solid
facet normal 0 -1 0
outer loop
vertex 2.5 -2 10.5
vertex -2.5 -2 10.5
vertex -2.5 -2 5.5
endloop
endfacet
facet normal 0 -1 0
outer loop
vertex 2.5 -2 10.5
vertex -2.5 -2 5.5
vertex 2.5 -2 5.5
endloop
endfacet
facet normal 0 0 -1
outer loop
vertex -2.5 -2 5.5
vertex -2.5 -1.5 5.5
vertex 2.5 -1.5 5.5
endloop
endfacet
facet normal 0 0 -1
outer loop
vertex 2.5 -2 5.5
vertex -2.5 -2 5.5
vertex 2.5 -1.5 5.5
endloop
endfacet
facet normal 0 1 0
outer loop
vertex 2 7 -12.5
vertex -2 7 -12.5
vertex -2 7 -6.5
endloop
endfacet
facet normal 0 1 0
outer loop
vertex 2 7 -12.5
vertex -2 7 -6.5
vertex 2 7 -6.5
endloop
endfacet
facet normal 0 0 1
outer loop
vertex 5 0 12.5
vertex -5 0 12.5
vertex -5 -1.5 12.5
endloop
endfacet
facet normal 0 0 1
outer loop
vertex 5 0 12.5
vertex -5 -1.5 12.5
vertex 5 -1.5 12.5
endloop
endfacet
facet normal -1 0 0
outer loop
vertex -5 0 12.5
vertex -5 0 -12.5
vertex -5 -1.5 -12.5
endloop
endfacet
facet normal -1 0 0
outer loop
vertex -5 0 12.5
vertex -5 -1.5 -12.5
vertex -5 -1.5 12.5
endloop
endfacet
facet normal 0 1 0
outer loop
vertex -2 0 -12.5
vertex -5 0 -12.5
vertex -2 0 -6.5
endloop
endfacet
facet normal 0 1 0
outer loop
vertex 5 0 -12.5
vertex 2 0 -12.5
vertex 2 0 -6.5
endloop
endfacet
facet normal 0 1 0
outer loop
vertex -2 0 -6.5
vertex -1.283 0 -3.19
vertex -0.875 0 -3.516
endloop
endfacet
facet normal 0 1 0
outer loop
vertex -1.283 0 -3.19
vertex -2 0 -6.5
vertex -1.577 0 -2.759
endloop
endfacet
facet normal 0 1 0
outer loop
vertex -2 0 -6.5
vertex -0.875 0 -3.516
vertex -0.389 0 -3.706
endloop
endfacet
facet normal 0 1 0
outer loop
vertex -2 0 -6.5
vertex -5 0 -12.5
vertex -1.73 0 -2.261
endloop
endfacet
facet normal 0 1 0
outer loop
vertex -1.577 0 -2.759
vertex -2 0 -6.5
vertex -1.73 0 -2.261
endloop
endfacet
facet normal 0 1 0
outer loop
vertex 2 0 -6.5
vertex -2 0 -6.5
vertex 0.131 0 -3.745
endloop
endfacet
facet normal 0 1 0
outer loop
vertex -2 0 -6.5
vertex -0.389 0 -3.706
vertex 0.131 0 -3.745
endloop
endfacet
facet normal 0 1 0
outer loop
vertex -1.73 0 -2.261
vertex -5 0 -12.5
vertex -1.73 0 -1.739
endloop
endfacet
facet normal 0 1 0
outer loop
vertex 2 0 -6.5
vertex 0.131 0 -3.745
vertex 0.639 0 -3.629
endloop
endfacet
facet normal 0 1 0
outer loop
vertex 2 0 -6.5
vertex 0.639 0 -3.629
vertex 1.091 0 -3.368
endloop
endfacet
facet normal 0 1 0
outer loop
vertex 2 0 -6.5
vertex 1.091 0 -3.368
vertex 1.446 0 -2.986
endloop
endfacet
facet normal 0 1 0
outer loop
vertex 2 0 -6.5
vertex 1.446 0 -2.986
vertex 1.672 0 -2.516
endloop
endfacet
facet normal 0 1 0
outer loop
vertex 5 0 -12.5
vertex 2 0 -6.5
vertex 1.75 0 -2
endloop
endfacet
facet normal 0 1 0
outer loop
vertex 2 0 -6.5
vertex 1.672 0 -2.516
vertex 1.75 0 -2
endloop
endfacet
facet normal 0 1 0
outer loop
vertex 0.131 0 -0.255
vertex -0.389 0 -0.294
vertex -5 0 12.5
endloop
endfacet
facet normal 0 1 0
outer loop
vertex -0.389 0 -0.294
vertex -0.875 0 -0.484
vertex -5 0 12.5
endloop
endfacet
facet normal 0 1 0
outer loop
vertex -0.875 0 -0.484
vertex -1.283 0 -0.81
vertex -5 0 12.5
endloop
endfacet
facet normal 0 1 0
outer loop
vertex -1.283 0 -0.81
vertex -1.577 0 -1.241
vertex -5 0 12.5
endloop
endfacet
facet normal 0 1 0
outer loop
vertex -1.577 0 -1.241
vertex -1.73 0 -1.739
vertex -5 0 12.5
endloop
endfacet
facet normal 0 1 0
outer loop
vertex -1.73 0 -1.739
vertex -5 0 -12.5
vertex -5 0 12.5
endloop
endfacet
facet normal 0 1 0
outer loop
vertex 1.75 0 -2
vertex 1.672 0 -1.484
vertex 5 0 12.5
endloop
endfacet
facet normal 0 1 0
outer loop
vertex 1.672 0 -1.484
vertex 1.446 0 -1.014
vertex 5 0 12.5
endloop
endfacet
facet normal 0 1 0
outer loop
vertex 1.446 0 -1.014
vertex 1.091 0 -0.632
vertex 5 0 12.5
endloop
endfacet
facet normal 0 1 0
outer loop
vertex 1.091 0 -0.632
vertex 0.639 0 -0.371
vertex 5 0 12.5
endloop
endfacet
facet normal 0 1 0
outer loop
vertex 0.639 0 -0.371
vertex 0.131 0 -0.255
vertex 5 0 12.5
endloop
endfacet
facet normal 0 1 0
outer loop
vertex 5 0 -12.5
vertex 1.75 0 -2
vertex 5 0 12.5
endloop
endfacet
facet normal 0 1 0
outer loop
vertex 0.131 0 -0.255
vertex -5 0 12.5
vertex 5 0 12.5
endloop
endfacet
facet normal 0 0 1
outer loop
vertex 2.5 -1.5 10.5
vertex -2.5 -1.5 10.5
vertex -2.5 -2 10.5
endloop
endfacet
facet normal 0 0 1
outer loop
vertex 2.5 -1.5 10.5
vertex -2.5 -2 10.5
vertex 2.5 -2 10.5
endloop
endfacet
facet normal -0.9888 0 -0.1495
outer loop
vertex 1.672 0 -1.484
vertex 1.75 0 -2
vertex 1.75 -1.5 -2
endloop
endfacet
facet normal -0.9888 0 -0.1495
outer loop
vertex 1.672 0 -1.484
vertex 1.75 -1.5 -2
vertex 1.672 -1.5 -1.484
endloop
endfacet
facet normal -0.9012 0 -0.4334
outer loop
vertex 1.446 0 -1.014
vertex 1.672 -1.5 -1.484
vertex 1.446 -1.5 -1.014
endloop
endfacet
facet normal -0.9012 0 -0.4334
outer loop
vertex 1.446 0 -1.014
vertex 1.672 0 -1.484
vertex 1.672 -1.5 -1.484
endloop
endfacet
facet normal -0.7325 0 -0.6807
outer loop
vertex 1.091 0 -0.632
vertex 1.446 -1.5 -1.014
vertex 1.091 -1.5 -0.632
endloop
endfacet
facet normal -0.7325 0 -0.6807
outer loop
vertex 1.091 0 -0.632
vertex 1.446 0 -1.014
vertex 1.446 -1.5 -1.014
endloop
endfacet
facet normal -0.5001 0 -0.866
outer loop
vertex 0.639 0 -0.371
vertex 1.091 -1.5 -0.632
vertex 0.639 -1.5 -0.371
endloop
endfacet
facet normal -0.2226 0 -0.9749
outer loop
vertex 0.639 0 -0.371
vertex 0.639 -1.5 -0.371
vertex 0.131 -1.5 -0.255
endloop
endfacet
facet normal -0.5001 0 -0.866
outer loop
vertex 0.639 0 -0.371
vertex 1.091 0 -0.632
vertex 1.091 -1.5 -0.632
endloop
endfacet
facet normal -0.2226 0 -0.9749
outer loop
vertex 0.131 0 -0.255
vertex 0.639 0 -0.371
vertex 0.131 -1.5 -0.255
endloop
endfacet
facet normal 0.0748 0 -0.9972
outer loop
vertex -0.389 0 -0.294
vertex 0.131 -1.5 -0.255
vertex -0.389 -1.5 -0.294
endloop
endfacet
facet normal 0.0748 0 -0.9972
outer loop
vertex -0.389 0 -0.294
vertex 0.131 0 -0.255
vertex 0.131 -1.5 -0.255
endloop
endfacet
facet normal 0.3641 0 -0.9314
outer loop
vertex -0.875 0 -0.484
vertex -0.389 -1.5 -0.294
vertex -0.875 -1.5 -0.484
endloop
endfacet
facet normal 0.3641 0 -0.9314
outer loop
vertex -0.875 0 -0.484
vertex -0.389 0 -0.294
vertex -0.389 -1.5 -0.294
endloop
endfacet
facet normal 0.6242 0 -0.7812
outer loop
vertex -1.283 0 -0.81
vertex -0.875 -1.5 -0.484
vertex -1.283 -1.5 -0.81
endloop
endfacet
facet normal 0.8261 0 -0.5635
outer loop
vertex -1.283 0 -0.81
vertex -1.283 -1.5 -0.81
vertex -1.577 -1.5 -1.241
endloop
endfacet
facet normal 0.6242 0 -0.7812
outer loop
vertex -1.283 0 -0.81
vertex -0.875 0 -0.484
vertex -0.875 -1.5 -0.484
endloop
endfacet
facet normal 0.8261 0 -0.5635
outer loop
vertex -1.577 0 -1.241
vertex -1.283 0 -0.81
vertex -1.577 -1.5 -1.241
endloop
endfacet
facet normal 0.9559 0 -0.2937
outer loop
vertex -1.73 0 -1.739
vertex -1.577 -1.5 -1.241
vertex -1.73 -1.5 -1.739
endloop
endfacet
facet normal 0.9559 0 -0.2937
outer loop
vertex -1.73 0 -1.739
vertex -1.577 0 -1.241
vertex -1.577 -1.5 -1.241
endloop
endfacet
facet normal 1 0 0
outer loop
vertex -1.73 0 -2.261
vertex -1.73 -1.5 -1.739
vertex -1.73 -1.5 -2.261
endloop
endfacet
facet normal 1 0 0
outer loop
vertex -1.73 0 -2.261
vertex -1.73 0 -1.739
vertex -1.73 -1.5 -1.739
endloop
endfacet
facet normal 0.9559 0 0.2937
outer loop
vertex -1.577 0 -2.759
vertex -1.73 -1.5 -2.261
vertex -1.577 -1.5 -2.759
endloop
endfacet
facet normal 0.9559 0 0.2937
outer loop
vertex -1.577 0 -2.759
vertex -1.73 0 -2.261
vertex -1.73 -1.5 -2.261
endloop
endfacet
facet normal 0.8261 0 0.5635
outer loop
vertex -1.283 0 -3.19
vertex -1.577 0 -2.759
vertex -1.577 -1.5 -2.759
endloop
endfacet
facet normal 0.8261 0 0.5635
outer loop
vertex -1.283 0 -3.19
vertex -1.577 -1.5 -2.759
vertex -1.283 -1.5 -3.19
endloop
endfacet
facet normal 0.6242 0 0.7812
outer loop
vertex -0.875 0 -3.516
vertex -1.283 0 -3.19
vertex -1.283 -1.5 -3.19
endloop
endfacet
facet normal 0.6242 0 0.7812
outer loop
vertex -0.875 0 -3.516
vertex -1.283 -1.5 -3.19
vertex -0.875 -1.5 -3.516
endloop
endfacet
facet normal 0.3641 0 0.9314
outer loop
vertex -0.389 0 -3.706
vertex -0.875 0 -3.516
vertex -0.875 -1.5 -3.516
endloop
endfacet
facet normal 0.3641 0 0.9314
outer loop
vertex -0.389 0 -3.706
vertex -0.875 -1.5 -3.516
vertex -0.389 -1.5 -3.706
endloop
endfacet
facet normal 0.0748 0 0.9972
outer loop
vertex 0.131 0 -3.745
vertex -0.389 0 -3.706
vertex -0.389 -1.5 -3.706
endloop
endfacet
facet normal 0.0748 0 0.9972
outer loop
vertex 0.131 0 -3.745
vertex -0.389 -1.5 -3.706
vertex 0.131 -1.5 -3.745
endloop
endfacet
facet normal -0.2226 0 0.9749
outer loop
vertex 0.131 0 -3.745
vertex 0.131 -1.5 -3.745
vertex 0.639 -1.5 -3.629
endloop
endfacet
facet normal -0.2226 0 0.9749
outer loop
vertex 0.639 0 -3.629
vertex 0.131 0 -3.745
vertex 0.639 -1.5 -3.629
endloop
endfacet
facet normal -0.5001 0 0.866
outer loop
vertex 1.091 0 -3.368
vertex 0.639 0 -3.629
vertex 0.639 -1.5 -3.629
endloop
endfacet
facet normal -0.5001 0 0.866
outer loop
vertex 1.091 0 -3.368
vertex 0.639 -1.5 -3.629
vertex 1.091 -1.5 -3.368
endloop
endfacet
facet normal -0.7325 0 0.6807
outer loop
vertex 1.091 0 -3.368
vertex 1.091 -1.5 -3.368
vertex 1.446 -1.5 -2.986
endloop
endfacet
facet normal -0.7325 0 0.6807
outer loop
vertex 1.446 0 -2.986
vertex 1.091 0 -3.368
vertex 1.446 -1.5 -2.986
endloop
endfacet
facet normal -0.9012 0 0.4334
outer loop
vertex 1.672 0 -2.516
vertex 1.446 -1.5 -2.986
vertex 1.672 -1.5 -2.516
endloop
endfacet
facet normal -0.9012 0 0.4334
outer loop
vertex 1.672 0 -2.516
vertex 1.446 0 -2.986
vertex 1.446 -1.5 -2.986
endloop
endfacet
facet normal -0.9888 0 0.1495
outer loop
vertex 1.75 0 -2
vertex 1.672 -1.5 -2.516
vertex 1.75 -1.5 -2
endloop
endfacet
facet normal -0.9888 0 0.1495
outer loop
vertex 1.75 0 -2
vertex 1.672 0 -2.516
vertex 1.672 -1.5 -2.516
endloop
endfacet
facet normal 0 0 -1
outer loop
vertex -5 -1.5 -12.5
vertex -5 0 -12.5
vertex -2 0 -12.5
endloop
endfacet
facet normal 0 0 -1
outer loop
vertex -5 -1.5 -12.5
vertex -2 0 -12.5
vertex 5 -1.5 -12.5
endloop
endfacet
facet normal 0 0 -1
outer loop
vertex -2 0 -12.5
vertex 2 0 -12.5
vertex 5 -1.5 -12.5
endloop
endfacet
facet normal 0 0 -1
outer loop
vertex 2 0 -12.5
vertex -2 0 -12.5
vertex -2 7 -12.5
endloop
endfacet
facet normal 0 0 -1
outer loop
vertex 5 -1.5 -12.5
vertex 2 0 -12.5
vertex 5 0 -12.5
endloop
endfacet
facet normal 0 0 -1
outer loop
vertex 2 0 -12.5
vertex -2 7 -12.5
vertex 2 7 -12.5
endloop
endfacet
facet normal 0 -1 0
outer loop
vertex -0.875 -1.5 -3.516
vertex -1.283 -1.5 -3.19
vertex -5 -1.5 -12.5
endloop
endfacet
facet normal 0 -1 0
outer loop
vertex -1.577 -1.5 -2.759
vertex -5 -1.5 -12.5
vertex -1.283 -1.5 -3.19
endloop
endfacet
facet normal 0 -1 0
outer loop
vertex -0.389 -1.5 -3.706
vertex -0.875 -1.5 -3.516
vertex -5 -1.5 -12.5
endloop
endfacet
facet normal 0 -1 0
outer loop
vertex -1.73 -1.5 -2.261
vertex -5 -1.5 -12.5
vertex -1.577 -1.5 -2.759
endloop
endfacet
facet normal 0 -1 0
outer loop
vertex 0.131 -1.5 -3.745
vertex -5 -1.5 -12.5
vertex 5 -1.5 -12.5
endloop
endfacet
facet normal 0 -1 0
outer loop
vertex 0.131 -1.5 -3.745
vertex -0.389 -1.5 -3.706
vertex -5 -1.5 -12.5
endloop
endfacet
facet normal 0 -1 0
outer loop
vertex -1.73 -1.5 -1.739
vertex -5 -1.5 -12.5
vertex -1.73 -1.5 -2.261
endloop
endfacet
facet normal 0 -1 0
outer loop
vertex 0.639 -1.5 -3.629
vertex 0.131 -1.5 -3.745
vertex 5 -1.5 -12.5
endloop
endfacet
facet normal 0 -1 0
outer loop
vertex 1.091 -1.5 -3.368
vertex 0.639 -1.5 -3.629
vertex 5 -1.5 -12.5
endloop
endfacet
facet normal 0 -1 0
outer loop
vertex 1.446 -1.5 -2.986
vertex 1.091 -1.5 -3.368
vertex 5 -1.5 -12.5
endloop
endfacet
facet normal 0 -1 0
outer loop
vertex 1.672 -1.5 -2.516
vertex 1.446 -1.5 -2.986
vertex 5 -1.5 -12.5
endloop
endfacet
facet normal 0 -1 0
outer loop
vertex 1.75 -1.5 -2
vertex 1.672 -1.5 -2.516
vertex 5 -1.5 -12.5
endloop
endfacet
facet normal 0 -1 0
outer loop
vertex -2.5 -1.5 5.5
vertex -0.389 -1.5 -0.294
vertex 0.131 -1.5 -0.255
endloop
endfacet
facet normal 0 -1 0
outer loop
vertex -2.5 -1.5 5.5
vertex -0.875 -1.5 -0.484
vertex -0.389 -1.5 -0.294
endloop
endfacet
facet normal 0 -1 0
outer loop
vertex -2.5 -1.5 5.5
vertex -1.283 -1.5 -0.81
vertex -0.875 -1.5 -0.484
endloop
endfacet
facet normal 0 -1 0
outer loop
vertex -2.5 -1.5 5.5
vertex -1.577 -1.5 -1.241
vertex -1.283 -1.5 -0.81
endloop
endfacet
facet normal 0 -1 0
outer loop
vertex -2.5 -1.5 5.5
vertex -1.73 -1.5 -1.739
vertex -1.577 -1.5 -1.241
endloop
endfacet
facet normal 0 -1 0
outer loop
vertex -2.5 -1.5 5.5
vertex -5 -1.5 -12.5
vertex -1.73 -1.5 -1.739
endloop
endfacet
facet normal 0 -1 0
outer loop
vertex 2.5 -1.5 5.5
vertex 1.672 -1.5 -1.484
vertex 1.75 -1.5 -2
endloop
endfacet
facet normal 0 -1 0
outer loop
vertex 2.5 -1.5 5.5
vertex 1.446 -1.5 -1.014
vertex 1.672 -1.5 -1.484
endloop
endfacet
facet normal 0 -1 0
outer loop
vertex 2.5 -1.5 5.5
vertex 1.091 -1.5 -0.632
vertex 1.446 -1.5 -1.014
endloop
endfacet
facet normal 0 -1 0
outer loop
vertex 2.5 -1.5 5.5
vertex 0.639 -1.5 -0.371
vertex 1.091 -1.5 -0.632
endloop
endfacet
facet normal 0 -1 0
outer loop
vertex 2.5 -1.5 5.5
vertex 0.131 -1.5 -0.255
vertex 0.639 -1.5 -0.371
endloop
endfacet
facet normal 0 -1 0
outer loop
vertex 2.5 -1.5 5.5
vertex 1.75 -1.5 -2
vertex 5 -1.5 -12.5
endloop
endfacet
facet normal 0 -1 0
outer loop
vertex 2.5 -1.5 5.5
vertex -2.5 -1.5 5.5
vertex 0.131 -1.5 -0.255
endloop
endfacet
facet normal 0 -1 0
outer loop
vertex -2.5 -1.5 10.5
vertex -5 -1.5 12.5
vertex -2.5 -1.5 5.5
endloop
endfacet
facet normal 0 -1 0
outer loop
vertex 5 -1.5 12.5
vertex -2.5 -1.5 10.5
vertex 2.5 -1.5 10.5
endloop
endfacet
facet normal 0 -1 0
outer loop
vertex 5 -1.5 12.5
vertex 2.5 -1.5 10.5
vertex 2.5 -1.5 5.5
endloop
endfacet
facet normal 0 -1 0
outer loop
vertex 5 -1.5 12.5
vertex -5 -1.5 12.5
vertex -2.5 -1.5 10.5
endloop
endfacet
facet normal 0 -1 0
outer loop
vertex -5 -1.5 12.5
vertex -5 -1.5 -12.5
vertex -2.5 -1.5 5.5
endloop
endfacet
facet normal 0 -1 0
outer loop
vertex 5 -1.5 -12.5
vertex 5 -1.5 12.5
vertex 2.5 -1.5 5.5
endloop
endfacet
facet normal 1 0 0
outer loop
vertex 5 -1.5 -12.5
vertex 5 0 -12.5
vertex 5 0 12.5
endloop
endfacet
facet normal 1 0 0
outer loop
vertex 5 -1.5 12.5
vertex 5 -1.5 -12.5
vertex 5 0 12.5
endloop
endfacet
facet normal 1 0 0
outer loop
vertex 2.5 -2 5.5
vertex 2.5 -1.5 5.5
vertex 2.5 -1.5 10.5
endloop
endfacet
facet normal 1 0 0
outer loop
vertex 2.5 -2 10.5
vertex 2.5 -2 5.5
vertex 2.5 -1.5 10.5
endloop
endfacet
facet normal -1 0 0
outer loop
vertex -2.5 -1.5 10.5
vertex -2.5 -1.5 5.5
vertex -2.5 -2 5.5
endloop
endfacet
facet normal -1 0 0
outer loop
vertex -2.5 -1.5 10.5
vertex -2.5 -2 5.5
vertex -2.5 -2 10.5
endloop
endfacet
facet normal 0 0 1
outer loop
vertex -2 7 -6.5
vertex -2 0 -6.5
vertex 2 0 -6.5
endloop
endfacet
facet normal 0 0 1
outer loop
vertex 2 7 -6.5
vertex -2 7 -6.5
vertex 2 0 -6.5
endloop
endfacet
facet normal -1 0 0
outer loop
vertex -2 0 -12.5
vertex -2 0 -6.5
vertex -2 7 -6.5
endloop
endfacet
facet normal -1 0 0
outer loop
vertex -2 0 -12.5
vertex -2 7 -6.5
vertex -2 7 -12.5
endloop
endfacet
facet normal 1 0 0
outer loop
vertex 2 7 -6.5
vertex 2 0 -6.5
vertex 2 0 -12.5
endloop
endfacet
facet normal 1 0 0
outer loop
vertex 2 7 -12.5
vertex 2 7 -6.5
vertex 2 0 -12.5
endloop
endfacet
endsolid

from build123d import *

# Parameters (mm, degrees)
SKETCH_W     = 10
SKETCH_H     = 25
SKETCH_R     = 1.75
PAD_DEPTH    = 1.5
SKETCH001_W  = 5
SKETCH001_H  = 5
PAD001_DEPTH = 0.5
SKETCH002_W  = 4
SKETCH002_H  = 6
PAD002_DEPTH = 7


with BuildPart() as part:
    # Sketch → Pad (new body)
    with BuildSketch(Plane.XZ):
        Rectangle(SKETCH_W, SKETCH_H)
        with Locations((0, -2)):
            Circle(SKETCH_R, mode=Mode.SUBTRACT)
    extrude(amount=PAD_DEPTH)

    # Sketch001 (on Face7 of Pad) → Pad001 (join)
    with BuildSketch(Plane.XZ.offset(1.5)):
        with Locations((0, 8)):
            Rectangle(SKETCH001_W, SKETCH001_H)
    extrude(amount=PAD001_DEPTH)

    # Sketch002 (on Face4 of Pad001) → Pad002 (join)
    with BuildSketch(Plane(origin=(0, 0, 0), x_dir=(1, 0, 0), z_dir=(0, 1, 0))):
        with Locations((0, 9.5)):
            Rectangle(SKETCH002_W, SKETCH002_H)
    extrude(amount=PAD002_DEPTH)


solid = part.part
